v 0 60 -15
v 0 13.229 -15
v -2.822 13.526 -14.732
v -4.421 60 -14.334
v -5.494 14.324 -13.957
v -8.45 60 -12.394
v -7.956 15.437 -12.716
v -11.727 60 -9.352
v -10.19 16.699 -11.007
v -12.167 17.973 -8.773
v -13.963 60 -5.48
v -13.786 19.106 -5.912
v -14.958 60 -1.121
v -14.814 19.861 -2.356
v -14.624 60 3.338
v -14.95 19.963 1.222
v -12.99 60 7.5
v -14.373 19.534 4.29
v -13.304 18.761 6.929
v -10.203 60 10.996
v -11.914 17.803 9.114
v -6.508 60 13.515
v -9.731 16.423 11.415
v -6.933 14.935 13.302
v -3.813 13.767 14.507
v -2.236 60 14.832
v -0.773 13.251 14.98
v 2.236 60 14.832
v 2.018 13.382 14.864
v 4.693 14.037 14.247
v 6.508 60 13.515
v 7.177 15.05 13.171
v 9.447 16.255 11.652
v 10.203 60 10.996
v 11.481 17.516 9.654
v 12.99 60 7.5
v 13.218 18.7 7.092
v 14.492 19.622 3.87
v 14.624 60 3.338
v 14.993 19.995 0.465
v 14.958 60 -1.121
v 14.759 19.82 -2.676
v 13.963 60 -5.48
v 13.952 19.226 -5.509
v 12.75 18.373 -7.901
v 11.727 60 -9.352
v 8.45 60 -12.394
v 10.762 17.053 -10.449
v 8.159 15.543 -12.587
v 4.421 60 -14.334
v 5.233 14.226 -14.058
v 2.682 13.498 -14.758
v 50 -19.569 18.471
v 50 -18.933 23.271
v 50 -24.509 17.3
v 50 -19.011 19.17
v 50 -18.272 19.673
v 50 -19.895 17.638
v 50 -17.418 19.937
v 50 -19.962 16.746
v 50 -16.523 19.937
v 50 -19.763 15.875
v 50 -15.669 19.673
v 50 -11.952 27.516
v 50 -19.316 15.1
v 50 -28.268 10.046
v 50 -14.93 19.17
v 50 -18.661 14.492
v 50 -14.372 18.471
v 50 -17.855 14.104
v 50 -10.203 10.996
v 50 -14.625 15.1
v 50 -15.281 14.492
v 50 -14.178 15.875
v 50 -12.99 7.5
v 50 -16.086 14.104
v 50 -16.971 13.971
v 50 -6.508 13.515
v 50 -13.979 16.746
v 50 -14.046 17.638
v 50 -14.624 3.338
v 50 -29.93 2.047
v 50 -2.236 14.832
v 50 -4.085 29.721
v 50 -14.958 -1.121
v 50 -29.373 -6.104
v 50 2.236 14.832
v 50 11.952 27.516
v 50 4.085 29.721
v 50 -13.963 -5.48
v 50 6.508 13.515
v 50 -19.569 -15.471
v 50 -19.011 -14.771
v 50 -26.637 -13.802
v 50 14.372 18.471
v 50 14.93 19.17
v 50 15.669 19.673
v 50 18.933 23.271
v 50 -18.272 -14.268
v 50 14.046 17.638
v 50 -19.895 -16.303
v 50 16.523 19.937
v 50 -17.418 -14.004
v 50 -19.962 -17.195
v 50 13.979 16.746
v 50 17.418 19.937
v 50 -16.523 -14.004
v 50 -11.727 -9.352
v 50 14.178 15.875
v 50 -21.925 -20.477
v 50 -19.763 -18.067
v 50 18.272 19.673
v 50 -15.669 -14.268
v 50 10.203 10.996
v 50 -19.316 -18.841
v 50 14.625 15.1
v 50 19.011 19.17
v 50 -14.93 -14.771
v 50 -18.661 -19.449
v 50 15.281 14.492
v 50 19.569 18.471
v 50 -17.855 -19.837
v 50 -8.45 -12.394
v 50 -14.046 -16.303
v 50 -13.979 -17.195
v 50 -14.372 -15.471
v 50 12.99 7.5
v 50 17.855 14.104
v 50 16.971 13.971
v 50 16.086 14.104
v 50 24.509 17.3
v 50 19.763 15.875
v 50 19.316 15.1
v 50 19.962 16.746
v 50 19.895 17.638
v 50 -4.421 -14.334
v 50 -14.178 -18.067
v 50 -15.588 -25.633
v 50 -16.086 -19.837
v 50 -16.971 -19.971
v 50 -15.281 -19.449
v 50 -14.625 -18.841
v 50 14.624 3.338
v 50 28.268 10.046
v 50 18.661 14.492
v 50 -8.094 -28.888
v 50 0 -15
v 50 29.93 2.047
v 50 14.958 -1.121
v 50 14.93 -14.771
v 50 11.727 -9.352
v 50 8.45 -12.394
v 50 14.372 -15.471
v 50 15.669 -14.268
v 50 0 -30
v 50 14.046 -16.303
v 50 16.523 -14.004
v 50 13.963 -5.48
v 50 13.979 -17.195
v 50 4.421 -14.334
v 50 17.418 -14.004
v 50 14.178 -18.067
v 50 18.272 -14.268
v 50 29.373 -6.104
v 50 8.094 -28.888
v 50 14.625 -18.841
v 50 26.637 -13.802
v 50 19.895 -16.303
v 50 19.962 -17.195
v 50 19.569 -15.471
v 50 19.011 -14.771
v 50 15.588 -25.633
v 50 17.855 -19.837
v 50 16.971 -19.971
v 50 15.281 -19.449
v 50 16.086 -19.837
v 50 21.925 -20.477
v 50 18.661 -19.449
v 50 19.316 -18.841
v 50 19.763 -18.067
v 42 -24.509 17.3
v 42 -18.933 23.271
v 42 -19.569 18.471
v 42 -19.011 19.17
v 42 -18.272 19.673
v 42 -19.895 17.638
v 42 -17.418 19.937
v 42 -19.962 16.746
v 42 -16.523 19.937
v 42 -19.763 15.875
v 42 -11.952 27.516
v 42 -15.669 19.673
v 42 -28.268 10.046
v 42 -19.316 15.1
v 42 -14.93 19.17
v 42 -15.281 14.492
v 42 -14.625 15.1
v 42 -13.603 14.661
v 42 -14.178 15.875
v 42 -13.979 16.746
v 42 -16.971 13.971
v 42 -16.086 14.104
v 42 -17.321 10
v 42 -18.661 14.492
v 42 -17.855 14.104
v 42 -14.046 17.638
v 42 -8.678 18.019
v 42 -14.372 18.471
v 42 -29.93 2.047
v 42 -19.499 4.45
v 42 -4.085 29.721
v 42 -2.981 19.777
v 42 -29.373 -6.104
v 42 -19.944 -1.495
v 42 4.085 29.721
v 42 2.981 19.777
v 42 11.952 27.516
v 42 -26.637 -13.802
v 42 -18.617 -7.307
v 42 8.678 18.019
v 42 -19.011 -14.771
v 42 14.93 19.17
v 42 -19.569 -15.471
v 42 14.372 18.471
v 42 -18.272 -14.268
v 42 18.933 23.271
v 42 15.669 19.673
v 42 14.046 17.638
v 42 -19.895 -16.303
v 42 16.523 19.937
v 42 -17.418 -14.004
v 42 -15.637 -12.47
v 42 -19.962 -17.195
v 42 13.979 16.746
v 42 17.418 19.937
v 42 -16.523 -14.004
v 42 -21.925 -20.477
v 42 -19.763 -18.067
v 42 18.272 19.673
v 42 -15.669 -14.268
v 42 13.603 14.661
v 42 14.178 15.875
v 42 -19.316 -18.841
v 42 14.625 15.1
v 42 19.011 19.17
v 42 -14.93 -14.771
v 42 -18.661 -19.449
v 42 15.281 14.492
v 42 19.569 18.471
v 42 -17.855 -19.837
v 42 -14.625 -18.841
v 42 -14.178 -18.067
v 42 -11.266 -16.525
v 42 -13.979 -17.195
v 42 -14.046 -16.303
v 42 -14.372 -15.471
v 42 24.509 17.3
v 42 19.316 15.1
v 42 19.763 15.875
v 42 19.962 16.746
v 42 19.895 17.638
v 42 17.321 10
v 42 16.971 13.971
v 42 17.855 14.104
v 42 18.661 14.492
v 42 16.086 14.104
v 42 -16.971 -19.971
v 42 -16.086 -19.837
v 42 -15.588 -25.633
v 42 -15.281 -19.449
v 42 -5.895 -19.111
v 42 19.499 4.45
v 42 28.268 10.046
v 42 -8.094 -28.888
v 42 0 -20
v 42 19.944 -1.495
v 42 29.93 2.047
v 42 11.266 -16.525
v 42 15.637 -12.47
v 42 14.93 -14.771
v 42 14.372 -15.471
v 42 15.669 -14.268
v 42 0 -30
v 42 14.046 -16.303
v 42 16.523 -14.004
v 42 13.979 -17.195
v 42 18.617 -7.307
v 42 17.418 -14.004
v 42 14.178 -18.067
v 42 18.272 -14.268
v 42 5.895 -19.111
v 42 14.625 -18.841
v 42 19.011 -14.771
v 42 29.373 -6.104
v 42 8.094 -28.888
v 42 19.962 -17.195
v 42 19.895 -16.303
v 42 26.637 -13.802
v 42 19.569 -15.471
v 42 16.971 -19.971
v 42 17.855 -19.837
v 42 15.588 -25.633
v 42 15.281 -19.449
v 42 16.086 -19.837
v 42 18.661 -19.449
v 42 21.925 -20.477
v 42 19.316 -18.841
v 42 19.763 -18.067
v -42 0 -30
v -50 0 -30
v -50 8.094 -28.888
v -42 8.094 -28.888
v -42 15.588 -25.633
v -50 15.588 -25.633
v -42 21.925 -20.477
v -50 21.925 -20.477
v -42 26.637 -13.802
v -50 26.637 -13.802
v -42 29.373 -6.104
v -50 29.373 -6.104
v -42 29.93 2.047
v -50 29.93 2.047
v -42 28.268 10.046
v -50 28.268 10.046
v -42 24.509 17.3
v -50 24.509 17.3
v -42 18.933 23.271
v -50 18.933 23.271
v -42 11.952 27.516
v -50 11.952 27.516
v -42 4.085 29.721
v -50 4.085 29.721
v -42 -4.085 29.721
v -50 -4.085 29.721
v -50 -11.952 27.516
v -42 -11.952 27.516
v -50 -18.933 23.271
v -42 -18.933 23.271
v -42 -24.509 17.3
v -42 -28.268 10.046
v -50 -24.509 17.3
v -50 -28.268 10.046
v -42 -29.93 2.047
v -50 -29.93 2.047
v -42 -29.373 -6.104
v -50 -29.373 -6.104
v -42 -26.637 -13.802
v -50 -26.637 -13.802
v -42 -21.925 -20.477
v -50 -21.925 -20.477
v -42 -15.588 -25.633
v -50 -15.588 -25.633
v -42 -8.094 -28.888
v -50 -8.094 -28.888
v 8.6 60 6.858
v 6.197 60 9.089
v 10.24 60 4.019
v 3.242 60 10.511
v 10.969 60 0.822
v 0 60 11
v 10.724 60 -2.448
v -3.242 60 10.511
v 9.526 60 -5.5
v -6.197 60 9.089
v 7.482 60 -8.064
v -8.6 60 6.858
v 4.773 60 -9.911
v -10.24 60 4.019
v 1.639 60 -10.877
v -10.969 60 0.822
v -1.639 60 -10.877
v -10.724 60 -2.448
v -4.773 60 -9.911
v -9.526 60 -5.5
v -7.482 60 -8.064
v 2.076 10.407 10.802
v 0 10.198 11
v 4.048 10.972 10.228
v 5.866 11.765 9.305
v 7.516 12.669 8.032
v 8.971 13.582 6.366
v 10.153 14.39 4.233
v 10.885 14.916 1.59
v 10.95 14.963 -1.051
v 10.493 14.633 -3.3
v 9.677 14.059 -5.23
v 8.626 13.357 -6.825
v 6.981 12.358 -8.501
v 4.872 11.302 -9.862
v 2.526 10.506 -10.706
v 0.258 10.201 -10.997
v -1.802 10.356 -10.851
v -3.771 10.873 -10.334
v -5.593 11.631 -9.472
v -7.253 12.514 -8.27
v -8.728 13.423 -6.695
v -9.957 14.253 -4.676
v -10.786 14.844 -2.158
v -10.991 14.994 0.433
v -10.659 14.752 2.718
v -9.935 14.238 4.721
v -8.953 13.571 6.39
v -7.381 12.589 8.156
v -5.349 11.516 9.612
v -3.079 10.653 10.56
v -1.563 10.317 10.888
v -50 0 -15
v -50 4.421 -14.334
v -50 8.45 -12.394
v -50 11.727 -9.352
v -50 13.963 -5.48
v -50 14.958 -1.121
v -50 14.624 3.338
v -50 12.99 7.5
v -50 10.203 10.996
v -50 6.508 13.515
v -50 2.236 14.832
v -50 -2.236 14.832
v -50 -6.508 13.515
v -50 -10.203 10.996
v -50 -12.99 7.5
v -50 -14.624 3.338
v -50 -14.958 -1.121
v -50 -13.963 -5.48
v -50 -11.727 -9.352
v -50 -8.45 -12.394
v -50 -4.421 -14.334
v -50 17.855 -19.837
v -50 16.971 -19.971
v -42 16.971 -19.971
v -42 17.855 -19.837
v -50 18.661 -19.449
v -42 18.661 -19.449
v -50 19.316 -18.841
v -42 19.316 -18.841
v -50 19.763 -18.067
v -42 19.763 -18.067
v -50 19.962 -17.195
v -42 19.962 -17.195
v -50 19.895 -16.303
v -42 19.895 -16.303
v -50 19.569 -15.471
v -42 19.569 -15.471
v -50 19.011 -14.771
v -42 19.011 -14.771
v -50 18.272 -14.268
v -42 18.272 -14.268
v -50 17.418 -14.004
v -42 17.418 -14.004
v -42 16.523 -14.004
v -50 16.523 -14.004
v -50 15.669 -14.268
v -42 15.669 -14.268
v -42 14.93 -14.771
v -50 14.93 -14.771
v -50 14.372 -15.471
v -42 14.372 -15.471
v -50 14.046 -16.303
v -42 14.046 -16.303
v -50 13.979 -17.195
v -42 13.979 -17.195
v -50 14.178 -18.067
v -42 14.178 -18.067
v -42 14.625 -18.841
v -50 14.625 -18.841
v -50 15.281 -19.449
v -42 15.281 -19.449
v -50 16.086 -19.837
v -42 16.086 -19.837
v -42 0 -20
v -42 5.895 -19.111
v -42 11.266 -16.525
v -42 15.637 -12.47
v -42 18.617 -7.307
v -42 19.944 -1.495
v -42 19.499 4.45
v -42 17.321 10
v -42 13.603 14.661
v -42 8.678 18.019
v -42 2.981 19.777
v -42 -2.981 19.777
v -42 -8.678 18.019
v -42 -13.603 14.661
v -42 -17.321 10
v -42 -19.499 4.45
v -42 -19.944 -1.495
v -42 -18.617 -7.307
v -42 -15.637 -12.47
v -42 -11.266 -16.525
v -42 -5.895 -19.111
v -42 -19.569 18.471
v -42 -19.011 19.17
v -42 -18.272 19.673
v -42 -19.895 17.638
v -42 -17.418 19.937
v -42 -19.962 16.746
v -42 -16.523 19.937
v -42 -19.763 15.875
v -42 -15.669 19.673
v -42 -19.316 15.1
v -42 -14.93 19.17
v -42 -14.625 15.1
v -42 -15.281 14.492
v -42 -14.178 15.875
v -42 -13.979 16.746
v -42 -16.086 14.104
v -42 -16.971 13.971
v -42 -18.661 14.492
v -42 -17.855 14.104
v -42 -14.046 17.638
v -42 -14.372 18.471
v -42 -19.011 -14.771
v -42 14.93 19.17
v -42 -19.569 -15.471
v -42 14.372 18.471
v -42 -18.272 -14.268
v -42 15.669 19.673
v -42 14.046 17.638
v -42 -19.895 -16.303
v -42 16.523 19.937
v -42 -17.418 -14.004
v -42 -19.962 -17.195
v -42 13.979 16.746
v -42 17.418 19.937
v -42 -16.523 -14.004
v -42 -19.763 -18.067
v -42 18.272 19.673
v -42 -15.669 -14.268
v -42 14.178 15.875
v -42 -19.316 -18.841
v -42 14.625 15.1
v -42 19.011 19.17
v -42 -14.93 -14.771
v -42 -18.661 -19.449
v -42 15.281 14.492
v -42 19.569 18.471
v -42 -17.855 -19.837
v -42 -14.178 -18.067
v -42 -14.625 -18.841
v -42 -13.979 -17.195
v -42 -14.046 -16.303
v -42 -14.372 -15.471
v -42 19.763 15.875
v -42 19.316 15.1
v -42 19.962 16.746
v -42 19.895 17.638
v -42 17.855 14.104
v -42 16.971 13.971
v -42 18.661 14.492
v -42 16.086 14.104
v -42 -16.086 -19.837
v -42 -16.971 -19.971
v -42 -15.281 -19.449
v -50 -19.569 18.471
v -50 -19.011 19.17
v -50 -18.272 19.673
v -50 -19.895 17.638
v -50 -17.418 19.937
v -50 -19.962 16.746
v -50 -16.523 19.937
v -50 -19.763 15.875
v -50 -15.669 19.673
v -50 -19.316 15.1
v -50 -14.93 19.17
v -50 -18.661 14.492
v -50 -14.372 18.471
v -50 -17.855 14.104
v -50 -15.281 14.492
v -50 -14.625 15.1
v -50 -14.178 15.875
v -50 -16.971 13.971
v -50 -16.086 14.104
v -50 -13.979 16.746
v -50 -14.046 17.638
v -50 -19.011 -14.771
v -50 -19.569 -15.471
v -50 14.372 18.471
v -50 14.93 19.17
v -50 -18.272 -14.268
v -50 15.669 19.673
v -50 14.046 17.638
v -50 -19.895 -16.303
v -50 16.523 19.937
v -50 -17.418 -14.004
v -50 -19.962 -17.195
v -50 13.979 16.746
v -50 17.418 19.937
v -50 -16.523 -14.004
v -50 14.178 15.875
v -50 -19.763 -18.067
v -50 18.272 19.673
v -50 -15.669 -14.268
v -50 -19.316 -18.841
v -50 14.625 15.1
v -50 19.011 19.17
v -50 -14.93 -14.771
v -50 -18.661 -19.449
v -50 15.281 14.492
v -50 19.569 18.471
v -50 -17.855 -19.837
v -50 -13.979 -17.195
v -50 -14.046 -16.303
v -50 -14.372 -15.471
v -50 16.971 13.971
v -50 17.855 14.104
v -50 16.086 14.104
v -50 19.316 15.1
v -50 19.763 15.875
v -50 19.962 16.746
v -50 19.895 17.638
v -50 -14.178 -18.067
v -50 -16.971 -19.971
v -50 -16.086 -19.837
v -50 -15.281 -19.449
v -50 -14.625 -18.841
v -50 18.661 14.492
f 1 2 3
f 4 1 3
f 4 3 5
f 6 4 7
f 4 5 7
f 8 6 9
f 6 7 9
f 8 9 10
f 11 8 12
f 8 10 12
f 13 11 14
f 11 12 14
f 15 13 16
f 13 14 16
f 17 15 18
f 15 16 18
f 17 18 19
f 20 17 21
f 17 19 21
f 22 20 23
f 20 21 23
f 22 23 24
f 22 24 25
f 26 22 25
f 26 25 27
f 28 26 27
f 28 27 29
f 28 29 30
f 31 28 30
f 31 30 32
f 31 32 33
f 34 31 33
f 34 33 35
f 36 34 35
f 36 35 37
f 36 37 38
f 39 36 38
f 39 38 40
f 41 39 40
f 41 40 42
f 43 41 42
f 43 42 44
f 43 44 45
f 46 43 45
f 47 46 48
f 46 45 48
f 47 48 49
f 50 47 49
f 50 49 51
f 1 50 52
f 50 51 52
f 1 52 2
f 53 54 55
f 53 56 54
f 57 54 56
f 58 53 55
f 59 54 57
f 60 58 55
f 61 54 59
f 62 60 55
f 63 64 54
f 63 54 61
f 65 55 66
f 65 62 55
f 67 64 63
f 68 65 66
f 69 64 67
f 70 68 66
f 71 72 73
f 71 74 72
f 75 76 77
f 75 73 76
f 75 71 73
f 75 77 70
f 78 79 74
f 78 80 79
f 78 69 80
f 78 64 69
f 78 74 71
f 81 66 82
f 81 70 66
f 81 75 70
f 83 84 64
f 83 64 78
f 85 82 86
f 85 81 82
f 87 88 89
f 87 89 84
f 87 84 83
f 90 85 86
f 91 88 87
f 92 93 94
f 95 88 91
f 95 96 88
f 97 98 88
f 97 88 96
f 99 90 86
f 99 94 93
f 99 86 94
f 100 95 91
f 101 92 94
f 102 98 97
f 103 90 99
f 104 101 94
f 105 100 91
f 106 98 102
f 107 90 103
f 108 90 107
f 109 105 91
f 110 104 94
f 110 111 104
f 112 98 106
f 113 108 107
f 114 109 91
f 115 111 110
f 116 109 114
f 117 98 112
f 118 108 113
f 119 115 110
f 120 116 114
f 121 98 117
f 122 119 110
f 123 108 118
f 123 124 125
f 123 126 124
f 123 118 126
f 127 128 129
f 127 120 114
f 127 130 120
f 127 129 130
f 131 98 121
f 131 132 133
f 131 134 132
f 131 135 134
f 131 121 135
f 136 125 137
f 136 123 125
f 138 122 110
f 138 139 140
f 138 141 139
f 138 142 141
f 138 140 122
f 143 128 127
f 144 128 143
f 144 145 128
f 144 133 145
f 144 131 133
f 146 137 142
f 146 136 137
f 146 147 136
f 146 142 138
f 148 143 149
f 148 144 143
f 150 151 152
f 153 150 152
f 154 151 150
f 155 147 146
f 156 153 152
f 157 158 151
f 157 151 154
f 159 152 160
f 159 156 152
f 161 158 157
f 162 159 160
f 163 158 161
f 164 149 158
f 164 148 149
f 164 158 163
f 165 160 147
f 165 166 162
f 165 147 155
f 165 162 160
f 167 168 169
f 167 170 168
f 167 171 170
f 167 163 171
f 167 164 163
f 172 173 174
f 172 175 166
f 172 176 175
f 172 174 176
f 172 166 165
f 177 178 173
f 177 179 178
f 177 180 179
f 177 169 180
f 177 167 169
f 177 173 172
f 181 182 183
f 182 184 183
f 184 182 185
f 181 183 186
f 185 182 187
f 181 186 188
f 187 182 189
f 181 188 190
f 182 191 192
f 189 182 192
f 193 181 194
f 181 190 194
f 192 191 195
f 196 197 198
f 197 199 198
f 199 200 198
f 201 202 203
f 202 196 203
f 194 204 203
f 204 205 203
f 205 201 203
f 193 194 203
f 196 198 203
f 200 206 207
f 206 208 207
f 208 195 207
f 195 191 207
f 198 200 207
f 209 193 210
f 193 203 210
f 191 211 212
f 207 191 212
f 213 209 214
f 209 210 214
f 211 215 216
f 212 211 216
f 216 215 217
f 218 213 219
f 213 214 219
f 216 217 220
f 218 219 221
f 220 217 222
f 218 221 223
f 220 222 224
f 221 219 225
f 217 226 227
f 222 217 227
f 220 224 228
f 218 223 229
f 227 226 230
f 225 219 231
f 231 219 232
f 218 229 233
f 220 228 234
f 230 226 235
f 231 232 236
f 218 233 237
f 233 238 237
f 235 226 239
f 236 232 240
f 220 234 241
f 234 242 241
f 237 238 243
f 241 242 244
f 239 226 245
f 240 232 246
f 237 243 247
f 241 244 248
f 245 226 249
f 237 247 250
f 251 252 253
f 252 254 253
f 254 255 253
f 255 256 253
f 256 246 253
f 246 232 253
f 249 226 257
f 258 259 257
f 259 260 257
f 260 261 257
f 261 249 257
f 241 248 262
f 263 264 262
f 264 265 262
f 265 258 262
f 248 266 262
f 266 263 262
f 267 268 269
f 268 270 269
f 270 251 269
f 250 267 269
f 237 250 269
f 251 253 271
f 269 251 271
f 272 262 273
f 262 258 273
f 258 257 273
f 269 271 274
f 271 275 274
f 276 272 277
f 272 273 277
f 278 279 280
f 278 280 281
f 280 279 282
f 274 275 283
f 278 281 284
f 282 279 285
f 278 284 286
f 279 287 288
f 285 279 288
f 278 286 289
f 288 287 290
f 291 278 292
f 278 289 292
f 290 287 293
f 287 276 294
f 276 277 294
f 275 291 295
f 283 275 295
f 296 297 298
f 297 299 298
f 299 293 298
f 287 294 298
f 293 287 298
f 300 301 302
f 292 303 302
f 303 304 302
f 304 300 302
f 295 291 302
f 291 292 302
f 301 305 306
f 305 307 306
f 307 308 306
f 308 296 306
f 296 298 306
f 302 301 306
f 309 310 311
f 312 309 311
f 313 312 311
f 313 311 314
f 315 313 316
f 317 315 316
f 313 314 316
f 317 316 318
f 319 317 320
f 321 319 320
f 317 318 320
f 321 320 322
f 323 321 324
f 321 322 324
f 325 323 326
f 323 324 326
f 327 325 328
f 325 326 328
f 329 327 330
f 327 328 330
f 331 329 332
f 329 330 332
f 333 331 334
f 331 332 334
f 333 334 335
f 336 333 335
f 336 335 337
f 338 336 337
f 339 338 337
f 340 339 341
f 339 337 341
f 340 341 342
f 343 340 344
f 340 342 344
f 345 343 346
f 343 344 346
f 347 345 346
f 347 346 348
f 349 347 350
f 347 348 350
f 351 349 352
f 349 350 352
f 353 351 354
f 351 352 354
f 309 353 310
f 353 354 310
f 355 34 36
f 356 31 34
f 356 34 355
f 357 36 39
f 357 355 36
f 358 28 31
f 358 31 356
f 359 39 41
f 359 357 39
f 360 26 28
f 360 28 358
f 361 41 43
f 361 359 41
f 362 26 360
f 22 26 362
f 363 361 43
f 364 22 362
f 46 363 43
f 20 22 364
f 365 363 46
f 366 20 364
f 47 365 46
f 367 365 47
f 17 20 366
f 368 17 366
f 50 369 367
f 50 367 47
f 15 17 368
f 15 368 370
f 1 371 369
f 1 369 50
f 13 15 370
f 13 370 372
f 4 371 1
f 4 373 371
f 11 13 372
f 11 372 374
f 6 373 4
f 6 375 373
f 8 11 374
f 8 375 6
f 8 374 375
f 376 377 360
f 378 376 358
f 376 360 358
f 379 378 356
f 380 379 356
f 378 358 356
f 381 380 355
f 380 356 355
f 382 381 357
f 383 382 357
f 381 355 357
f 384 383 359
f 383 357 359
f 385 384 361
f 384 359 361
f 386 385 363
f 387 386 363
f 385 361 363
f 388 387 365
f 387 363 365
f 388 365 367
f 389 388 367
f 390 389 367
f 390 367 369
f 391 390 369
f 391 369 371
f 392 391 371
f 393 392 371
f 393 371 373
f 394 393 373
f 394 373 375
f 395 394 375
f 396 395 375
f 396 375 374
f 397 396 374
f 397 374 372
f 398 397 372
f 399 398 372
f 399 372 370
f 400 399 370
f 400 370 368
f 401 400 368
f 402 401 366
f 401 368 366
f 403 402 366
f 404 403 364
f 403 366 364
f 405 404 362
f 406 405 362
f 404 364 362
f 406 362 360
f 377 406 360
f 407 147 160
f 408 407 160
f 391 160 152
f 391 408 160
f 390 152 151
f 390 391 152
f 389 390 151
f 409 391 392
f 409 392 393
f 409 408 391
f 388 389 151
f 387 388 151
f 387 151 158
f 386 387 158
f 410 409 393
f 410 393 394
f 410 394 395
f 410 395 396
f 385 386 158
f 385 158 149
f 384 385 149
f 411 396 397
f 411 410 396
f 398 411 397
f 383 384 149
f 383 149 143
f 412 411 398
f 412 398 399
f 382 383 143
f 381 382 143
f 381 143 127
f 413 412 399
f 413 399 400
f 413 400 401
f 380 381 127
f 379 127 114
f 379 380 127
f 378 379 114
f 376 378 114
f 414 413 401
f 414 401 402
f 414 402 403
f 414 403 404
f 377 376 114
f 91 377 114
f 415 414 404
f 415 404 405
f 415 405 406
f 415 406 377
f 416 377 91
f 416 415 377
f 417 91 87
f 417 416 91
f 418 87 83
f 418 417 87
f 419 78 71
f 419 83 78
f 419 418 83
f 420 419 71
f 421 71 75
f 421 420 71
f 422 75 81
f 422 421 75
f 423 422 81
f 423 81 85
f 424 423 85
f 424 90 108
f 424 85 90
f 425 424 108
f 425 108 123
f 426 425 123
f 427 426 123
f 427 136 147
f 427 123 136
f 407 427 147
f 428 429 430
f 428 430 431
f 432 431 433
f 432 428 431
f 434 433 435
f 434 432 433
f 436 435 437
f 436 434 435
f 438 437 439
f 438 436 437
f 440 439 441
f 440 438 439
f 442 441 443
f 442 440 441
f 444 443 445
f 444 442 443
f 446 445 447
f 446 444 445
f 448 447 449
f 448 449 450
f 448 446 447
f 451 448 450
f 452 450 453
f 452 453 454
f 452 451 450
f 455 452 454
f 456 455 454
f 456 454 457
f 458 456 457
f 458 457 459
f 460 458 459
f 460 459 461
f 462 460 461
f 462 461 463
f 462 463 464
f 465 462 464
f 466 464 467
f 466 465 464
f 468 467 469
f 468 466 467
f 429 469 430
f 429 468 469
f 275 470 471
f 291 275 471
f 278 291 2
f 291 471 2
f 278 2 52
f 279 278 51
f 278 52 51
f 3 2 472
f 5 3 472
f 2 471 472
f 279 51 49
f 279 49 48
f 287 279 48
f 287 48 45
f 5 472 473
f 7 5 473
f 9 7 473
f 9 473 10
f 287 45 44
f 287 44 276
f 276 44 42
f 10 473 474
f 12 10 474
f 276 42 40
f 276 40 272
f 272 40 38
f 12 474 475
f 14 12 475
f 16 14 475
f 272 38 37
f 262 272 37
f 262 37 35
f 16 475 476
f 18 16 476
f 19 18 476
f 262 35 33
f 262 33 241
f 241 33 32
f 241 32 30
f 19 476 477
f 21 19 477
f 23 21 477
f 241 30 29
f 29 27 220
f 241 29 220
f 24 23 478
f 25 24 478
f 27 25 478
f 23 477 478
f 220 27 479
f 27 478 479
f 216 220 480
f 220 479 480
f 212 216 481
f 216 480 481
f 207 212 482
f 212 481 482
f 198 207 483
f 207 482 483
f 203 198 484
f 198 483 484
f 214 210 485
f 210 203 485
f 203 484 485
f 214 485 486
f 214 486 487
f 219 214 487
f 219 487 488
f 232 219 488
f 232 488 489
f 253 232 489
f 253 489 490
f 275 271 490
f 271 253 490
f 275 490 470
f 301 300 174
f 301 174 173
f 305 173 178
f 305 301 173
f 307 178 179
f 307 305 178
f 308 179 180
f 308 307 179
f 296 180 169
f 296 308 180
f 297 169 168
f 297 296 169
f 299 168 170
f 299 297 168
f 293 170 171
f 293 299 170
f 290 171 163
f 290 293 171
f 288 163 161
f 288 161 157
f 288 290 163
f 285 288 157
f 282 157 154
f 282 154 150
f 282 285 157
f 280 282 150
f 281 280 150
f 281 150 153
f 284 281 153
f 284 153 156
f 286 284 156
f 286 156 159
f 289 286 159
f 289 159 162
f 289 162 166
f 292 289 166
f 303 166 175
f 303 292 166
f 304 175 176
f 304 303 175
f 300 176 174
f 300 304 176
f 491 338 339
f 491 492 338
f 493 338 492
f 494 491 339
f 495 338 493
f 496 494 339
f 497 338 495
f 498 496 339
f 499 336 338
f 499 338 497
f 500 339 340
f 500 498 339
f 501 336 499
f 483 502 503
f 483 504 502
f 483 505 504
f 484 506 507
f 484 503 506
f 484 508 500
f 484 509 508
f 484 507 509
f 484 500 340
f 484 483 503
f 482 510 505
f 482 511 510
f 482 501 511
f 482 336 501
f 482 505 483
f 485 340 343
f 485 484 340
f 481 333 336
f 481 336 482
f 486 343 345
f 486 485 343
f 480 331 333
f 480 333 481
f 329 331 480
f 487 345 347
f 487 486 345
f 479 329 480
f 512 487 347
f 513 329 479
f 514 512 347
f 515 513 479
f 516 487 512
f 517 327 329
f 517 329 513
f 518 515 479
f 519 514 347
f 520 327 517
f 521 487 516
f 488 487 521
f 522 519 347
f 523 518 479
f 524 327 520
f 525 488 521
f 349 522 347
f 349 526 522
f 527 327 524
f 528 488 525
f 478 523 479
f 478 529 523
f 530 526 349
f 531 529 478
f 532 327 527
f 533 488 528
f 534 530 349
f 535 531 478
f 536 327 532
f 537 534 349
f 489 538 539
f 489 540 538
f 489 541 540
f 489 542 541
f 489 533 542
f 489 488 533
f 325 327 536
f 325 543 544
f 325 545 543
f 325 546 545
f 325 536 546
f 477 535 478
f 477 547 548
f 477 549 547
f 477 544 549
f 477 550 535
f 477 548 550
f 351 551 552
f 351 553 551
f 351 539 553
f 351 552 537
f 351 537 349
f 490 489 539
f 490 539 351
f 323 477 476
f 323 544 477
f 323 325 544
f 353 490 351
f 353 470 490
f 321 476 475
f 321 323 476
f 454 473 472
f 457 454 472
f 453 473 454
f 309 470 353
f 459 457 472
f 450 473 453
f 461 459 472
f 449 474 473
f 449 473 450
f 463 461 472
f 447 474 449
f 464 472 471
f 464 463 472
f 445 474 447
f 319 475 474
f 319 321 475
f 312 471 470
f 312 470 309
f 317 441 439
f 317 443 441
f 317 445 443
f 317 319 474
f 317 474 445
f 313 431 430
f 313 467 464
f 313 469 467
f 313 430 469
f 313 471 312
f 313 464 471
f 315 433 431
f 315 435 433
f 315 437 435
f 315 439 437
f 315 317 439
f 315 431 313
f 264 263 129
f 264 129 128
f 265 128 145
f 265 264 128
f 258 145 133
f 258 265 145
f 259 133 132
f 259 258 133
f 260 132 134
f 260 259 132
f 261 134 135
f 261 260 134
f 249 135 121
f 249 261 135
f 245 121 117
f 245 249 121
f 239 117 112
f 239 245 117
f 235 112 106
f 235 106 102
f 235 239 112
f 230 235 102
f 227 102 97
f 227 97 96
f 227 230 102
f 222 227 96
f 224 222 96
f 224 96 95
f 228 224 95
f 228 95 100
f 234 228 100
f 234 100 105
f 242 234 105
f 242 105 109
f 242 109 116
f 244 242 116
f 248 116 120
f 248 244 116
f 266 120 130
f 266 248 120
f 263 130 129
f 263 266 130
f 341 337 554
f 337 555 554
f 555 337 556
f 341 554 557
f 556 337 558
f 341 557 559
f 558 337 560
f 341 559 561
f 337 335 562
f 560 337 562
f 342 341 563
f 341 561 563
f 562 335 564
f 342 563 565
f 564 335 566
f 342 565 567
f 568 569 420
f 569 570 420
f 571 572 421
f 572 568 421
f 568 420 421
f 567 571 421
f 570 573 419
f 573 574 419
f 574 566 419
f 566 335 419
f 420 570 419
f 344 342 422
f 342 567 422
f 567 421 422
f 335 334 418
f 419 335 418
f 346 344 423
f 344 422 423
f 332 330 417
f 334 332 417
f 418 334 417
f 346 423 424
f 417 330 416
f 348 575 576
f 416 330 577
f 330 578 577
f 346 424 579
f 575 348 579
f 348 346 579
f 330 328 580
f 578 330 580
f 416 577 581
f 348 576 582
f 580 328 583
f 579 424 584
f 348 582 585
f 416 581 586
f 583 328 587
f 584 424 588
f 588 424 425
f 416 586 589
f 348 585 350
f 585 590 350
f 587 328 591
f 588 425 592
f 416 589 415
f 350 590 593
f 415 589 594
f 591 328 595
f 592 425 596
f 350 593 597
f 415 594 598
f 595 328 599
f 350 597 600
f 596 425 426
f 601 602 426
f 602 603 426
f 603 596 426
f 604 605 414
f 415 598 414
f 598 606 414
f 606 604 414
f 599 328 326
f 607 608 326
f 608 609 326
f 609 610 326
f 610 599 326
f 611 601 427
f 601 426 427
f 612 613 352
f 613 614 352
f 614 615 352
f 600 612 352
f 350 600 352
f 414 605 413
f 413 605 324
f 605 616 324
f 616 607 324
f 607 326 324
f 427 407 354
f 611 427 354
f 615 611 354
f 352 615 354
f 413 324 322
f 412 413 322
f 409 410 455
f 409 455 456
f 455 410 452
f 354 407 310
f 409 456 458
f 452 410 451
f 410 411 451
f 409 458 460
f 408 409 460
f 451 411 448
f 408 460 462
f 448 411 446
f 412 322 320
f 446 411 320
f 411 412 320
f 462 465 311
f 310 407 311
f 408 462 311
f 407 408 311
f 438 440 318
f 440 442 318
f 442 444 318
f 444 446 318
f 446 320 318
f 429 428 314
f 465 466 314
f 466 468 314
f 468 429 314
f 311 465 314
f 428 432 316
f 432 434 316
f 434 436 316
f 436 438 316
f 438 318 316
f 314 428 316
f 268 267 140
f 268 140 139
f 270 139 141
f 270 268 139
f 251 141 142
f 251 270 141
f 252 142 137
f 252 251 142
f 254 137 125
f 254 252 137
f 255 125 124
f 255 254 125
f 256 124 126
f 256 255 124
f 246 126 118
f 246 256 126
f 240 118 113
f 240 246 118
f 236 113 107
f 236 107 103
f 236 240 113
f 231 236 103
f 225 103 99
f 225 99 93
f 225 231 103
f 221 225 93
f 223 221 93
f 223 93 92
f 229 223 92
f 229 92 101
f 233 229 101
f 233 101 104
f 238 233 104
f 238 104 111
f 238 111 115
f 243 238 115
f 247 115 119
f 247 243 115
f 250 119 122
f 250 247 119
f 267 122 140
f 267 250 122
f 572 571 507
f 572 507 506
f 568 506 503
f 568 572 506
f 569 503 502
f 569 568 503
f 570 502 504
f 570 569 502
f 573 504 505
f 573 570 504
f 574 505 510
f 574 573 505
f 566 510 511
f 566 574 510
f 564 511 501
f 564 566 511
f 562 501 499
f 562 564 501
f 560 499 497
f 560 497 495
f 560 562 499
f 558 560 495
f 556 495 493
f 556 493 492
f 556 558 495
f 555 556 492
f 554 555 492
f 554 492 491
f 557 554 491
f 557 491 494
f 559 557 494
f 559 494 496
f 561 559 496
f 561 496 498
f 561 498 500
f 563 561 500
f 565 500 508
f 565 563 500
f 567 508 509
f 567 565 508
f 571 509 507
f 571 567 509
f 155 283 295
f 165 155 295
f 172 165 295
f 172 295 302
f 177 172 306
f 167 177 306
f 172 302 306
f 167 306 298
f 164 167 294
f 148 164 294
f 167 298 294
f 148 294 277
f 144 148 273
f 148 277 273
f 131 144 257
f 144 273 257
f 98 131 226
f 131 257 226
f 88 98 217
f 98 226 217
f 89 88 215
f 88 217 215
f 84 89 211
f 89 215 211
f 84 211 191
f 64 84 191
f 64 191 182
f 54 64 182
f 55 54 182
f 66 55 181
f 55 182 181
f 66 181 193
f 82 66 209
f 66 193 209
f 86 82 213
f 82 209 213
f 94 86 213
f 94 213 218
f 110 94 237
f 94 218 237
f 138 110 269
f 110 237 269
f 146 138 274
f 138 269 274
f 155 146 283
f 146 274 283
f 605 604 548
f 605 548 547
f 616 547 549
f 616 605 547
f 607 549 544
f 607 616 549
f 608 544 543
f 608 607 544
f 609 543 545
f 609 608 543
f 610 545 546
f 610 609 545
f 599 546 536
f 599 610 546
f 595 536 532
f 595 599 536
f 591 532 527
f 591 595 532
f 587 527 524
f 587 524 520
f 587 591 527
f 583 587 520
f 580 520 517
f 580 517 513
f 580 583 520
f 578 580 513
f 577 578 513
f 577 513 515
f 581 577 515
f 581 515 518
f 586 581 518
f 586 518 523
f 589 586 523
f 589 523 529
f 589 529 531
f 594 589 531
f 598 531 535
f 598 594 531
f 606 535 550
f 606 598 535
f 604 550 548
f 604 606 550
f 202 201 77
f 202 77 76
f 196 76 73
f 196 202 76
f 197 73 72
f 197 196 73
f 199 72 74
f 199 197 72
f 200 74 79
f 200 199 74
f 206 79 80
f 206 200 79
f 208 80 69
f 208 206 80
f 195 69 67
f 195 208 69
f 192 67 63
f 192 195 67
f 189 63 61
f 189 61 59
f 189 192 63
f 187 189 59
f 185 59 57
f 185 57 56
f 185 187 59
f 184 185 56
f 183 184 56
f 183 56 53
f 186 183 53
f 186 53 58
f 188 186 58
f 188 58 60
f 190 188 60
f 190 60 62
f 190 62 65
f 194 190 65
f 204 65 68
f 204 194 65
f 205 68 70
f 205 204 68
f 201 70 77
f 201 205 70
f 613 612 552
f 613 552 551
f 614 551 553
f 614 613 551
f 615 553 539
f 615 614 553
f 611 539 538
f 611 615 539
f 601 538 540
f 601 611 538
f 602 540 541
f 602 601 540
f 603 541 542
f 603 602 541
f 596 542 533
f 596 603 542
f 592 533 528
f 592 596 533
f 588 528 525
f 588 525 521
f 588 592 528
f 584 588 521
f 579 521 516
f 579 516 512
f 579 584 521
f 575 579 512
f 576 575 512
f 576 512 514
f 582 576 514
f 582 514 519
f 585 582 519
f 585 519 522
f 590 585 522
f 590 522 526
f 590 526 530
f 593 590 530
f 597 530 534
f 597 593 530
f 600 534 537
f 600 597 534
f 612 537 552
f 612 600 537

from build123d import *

# Parameters (mm, degrees)
SKETCH_1_R          = 20
EXTRUDE_1_DEPTH     = 100
SKETCH_2_R          = 30
EXTRUDE_2_DEPTH     = 8
SKETCH_3_R          = 30
EXTRUDE_3_DEPTH     = 8
SKETCH_4_R          = 15
EXTRUDE_4_DEPTH     = 60
SKETCH_5_R          = 15
CUT_EXTRUDE_1_DEPTH = 121.415945838
SKETCH_7_R          = 11
CUT_EXTRUDE_3_DEPTH = 60
SKETCH_8_R          = 3
CUT_EXTRUDE_4_DEPTH = 8
CUT_EXTRUDE_START   = -8
SKETCH_9_R          = 3
CUT_EXTRUDE_5_DEPTH = 8


with BuildPart() as part:
    # 草图1 → 凸台-拉伸1 (new body)
    with BuildSketch(Plane(origin=(-50, 0, 0), x_dir=(0, 0, -1), z_dir=(1, 0, 0))):
        Circle(SKETCH_1_R)
    extrude(amount=EXTRUDE_1_DEPTH)

    # 草图2 → 凸台-拉伸2 (add)
    with BuildSketch(Plane(origin=(-50, 0, 0), x_dir=(0, 0, -1), z_dir=(1, 0, 0))):
        Circle(SKETCH_2_R)
    extrude(amount=EXTRUDE_2_DEPTH)

    # 草图3 → 凸台-拉伸3 (add)
    with BuildSketch(Plane(origin=(42, 0, 0), x_dir=(0, 0, -1), z_dir=(1, 0, 0))):
        Circle(SKETCH_3_R)
    extrude(amount=EXTRUDE_3_DEPTH)

    # 草图4 → 凸台-拉伸4 (add)
    with BuildSketch(Plane(origin=(0, 0, 0), x_dir=(1, 0, 0), z_dir=(0, 1, 0))):
        with Locations(Location((0, 0, 0), (0, 0, 90))):
            Circle(SKETCH_4_R)
    extrude(amount=EXTRUDE_4_DEPTH)

    # 草图5 → 切除-拉伸1 (cut, through all)
    with BuildSketch(Plane(origin=(-50, 0, 0), x_dir=(0, 0, -1), z_dir=(1, 0, 0))):
        Circle(SKETCH_5_R)
    extrude(amount=CUT_EXTRUDE_1_DEPTH, mode=Mode.SUBTRACT)

    # 草图7 → 切除-拉伸3 (cut)
    with BuildSketch(Plane(origin=(0, 60, 0), x_dir=(1, 0, 0), z_dir=(0, 1, 0))):
        with Locations(Location((0, 0, 0), (0, 0, 270))):
            Circle(SKETCH_7_R)
    extrude(amount=-CUT_EXTRUDE_3_DEPTH, mode=Mode.SUBTRACT)

    # 草图8 → 切除-拉伸4 (cut)
    with BuildSketch(Plane(origin=(-50, 0, 0), x_dir=(0, 0, -1), z_dir=(1, 0, 0))):
        with Locations((-16.970563, 16.970563)):
            Circle(SKETCH_8_R)
        with Locations((16.970563, 16.970563)):
            Circle(SKETCH_8_R)
        with Locations((16.970563, -16.970563)):
            Circle(SKETCH_8_R)
        with Locations((-16.970563, -16.970563)):
            Circle(SKETCH_8_R)
    extrude(amount=CUT_EXTRUDE_4_DEPTH, mode=Mode.SUBTRACT)

    # 草图9 → 切除-拉伸5 (cut)
    with BuildSketch(Plane(origin=(50, 0, 0), x_dir=(0, 0, -1), z_dir=(1, 0, 0)).offset(CUT_EXTRUDE_START)):
        with Locations((-16.970563, 16.970563)):
            Circle(SKETCH_9_R)
        with Locations((16.970563, 16.970563)):
            Circle(SKETCH_9_R)
        with Locations((16.970563, -16.970563)):
            Circle(SKETCH_9_R)
        with Locations((-16.970563, -16.970563)):
            Circle(SKETCH_9_R)
    extrude(amount=CUT_EXTRUDE_5_DEPTH, mode=Mode.SUBTRACT)


solid = part.part
